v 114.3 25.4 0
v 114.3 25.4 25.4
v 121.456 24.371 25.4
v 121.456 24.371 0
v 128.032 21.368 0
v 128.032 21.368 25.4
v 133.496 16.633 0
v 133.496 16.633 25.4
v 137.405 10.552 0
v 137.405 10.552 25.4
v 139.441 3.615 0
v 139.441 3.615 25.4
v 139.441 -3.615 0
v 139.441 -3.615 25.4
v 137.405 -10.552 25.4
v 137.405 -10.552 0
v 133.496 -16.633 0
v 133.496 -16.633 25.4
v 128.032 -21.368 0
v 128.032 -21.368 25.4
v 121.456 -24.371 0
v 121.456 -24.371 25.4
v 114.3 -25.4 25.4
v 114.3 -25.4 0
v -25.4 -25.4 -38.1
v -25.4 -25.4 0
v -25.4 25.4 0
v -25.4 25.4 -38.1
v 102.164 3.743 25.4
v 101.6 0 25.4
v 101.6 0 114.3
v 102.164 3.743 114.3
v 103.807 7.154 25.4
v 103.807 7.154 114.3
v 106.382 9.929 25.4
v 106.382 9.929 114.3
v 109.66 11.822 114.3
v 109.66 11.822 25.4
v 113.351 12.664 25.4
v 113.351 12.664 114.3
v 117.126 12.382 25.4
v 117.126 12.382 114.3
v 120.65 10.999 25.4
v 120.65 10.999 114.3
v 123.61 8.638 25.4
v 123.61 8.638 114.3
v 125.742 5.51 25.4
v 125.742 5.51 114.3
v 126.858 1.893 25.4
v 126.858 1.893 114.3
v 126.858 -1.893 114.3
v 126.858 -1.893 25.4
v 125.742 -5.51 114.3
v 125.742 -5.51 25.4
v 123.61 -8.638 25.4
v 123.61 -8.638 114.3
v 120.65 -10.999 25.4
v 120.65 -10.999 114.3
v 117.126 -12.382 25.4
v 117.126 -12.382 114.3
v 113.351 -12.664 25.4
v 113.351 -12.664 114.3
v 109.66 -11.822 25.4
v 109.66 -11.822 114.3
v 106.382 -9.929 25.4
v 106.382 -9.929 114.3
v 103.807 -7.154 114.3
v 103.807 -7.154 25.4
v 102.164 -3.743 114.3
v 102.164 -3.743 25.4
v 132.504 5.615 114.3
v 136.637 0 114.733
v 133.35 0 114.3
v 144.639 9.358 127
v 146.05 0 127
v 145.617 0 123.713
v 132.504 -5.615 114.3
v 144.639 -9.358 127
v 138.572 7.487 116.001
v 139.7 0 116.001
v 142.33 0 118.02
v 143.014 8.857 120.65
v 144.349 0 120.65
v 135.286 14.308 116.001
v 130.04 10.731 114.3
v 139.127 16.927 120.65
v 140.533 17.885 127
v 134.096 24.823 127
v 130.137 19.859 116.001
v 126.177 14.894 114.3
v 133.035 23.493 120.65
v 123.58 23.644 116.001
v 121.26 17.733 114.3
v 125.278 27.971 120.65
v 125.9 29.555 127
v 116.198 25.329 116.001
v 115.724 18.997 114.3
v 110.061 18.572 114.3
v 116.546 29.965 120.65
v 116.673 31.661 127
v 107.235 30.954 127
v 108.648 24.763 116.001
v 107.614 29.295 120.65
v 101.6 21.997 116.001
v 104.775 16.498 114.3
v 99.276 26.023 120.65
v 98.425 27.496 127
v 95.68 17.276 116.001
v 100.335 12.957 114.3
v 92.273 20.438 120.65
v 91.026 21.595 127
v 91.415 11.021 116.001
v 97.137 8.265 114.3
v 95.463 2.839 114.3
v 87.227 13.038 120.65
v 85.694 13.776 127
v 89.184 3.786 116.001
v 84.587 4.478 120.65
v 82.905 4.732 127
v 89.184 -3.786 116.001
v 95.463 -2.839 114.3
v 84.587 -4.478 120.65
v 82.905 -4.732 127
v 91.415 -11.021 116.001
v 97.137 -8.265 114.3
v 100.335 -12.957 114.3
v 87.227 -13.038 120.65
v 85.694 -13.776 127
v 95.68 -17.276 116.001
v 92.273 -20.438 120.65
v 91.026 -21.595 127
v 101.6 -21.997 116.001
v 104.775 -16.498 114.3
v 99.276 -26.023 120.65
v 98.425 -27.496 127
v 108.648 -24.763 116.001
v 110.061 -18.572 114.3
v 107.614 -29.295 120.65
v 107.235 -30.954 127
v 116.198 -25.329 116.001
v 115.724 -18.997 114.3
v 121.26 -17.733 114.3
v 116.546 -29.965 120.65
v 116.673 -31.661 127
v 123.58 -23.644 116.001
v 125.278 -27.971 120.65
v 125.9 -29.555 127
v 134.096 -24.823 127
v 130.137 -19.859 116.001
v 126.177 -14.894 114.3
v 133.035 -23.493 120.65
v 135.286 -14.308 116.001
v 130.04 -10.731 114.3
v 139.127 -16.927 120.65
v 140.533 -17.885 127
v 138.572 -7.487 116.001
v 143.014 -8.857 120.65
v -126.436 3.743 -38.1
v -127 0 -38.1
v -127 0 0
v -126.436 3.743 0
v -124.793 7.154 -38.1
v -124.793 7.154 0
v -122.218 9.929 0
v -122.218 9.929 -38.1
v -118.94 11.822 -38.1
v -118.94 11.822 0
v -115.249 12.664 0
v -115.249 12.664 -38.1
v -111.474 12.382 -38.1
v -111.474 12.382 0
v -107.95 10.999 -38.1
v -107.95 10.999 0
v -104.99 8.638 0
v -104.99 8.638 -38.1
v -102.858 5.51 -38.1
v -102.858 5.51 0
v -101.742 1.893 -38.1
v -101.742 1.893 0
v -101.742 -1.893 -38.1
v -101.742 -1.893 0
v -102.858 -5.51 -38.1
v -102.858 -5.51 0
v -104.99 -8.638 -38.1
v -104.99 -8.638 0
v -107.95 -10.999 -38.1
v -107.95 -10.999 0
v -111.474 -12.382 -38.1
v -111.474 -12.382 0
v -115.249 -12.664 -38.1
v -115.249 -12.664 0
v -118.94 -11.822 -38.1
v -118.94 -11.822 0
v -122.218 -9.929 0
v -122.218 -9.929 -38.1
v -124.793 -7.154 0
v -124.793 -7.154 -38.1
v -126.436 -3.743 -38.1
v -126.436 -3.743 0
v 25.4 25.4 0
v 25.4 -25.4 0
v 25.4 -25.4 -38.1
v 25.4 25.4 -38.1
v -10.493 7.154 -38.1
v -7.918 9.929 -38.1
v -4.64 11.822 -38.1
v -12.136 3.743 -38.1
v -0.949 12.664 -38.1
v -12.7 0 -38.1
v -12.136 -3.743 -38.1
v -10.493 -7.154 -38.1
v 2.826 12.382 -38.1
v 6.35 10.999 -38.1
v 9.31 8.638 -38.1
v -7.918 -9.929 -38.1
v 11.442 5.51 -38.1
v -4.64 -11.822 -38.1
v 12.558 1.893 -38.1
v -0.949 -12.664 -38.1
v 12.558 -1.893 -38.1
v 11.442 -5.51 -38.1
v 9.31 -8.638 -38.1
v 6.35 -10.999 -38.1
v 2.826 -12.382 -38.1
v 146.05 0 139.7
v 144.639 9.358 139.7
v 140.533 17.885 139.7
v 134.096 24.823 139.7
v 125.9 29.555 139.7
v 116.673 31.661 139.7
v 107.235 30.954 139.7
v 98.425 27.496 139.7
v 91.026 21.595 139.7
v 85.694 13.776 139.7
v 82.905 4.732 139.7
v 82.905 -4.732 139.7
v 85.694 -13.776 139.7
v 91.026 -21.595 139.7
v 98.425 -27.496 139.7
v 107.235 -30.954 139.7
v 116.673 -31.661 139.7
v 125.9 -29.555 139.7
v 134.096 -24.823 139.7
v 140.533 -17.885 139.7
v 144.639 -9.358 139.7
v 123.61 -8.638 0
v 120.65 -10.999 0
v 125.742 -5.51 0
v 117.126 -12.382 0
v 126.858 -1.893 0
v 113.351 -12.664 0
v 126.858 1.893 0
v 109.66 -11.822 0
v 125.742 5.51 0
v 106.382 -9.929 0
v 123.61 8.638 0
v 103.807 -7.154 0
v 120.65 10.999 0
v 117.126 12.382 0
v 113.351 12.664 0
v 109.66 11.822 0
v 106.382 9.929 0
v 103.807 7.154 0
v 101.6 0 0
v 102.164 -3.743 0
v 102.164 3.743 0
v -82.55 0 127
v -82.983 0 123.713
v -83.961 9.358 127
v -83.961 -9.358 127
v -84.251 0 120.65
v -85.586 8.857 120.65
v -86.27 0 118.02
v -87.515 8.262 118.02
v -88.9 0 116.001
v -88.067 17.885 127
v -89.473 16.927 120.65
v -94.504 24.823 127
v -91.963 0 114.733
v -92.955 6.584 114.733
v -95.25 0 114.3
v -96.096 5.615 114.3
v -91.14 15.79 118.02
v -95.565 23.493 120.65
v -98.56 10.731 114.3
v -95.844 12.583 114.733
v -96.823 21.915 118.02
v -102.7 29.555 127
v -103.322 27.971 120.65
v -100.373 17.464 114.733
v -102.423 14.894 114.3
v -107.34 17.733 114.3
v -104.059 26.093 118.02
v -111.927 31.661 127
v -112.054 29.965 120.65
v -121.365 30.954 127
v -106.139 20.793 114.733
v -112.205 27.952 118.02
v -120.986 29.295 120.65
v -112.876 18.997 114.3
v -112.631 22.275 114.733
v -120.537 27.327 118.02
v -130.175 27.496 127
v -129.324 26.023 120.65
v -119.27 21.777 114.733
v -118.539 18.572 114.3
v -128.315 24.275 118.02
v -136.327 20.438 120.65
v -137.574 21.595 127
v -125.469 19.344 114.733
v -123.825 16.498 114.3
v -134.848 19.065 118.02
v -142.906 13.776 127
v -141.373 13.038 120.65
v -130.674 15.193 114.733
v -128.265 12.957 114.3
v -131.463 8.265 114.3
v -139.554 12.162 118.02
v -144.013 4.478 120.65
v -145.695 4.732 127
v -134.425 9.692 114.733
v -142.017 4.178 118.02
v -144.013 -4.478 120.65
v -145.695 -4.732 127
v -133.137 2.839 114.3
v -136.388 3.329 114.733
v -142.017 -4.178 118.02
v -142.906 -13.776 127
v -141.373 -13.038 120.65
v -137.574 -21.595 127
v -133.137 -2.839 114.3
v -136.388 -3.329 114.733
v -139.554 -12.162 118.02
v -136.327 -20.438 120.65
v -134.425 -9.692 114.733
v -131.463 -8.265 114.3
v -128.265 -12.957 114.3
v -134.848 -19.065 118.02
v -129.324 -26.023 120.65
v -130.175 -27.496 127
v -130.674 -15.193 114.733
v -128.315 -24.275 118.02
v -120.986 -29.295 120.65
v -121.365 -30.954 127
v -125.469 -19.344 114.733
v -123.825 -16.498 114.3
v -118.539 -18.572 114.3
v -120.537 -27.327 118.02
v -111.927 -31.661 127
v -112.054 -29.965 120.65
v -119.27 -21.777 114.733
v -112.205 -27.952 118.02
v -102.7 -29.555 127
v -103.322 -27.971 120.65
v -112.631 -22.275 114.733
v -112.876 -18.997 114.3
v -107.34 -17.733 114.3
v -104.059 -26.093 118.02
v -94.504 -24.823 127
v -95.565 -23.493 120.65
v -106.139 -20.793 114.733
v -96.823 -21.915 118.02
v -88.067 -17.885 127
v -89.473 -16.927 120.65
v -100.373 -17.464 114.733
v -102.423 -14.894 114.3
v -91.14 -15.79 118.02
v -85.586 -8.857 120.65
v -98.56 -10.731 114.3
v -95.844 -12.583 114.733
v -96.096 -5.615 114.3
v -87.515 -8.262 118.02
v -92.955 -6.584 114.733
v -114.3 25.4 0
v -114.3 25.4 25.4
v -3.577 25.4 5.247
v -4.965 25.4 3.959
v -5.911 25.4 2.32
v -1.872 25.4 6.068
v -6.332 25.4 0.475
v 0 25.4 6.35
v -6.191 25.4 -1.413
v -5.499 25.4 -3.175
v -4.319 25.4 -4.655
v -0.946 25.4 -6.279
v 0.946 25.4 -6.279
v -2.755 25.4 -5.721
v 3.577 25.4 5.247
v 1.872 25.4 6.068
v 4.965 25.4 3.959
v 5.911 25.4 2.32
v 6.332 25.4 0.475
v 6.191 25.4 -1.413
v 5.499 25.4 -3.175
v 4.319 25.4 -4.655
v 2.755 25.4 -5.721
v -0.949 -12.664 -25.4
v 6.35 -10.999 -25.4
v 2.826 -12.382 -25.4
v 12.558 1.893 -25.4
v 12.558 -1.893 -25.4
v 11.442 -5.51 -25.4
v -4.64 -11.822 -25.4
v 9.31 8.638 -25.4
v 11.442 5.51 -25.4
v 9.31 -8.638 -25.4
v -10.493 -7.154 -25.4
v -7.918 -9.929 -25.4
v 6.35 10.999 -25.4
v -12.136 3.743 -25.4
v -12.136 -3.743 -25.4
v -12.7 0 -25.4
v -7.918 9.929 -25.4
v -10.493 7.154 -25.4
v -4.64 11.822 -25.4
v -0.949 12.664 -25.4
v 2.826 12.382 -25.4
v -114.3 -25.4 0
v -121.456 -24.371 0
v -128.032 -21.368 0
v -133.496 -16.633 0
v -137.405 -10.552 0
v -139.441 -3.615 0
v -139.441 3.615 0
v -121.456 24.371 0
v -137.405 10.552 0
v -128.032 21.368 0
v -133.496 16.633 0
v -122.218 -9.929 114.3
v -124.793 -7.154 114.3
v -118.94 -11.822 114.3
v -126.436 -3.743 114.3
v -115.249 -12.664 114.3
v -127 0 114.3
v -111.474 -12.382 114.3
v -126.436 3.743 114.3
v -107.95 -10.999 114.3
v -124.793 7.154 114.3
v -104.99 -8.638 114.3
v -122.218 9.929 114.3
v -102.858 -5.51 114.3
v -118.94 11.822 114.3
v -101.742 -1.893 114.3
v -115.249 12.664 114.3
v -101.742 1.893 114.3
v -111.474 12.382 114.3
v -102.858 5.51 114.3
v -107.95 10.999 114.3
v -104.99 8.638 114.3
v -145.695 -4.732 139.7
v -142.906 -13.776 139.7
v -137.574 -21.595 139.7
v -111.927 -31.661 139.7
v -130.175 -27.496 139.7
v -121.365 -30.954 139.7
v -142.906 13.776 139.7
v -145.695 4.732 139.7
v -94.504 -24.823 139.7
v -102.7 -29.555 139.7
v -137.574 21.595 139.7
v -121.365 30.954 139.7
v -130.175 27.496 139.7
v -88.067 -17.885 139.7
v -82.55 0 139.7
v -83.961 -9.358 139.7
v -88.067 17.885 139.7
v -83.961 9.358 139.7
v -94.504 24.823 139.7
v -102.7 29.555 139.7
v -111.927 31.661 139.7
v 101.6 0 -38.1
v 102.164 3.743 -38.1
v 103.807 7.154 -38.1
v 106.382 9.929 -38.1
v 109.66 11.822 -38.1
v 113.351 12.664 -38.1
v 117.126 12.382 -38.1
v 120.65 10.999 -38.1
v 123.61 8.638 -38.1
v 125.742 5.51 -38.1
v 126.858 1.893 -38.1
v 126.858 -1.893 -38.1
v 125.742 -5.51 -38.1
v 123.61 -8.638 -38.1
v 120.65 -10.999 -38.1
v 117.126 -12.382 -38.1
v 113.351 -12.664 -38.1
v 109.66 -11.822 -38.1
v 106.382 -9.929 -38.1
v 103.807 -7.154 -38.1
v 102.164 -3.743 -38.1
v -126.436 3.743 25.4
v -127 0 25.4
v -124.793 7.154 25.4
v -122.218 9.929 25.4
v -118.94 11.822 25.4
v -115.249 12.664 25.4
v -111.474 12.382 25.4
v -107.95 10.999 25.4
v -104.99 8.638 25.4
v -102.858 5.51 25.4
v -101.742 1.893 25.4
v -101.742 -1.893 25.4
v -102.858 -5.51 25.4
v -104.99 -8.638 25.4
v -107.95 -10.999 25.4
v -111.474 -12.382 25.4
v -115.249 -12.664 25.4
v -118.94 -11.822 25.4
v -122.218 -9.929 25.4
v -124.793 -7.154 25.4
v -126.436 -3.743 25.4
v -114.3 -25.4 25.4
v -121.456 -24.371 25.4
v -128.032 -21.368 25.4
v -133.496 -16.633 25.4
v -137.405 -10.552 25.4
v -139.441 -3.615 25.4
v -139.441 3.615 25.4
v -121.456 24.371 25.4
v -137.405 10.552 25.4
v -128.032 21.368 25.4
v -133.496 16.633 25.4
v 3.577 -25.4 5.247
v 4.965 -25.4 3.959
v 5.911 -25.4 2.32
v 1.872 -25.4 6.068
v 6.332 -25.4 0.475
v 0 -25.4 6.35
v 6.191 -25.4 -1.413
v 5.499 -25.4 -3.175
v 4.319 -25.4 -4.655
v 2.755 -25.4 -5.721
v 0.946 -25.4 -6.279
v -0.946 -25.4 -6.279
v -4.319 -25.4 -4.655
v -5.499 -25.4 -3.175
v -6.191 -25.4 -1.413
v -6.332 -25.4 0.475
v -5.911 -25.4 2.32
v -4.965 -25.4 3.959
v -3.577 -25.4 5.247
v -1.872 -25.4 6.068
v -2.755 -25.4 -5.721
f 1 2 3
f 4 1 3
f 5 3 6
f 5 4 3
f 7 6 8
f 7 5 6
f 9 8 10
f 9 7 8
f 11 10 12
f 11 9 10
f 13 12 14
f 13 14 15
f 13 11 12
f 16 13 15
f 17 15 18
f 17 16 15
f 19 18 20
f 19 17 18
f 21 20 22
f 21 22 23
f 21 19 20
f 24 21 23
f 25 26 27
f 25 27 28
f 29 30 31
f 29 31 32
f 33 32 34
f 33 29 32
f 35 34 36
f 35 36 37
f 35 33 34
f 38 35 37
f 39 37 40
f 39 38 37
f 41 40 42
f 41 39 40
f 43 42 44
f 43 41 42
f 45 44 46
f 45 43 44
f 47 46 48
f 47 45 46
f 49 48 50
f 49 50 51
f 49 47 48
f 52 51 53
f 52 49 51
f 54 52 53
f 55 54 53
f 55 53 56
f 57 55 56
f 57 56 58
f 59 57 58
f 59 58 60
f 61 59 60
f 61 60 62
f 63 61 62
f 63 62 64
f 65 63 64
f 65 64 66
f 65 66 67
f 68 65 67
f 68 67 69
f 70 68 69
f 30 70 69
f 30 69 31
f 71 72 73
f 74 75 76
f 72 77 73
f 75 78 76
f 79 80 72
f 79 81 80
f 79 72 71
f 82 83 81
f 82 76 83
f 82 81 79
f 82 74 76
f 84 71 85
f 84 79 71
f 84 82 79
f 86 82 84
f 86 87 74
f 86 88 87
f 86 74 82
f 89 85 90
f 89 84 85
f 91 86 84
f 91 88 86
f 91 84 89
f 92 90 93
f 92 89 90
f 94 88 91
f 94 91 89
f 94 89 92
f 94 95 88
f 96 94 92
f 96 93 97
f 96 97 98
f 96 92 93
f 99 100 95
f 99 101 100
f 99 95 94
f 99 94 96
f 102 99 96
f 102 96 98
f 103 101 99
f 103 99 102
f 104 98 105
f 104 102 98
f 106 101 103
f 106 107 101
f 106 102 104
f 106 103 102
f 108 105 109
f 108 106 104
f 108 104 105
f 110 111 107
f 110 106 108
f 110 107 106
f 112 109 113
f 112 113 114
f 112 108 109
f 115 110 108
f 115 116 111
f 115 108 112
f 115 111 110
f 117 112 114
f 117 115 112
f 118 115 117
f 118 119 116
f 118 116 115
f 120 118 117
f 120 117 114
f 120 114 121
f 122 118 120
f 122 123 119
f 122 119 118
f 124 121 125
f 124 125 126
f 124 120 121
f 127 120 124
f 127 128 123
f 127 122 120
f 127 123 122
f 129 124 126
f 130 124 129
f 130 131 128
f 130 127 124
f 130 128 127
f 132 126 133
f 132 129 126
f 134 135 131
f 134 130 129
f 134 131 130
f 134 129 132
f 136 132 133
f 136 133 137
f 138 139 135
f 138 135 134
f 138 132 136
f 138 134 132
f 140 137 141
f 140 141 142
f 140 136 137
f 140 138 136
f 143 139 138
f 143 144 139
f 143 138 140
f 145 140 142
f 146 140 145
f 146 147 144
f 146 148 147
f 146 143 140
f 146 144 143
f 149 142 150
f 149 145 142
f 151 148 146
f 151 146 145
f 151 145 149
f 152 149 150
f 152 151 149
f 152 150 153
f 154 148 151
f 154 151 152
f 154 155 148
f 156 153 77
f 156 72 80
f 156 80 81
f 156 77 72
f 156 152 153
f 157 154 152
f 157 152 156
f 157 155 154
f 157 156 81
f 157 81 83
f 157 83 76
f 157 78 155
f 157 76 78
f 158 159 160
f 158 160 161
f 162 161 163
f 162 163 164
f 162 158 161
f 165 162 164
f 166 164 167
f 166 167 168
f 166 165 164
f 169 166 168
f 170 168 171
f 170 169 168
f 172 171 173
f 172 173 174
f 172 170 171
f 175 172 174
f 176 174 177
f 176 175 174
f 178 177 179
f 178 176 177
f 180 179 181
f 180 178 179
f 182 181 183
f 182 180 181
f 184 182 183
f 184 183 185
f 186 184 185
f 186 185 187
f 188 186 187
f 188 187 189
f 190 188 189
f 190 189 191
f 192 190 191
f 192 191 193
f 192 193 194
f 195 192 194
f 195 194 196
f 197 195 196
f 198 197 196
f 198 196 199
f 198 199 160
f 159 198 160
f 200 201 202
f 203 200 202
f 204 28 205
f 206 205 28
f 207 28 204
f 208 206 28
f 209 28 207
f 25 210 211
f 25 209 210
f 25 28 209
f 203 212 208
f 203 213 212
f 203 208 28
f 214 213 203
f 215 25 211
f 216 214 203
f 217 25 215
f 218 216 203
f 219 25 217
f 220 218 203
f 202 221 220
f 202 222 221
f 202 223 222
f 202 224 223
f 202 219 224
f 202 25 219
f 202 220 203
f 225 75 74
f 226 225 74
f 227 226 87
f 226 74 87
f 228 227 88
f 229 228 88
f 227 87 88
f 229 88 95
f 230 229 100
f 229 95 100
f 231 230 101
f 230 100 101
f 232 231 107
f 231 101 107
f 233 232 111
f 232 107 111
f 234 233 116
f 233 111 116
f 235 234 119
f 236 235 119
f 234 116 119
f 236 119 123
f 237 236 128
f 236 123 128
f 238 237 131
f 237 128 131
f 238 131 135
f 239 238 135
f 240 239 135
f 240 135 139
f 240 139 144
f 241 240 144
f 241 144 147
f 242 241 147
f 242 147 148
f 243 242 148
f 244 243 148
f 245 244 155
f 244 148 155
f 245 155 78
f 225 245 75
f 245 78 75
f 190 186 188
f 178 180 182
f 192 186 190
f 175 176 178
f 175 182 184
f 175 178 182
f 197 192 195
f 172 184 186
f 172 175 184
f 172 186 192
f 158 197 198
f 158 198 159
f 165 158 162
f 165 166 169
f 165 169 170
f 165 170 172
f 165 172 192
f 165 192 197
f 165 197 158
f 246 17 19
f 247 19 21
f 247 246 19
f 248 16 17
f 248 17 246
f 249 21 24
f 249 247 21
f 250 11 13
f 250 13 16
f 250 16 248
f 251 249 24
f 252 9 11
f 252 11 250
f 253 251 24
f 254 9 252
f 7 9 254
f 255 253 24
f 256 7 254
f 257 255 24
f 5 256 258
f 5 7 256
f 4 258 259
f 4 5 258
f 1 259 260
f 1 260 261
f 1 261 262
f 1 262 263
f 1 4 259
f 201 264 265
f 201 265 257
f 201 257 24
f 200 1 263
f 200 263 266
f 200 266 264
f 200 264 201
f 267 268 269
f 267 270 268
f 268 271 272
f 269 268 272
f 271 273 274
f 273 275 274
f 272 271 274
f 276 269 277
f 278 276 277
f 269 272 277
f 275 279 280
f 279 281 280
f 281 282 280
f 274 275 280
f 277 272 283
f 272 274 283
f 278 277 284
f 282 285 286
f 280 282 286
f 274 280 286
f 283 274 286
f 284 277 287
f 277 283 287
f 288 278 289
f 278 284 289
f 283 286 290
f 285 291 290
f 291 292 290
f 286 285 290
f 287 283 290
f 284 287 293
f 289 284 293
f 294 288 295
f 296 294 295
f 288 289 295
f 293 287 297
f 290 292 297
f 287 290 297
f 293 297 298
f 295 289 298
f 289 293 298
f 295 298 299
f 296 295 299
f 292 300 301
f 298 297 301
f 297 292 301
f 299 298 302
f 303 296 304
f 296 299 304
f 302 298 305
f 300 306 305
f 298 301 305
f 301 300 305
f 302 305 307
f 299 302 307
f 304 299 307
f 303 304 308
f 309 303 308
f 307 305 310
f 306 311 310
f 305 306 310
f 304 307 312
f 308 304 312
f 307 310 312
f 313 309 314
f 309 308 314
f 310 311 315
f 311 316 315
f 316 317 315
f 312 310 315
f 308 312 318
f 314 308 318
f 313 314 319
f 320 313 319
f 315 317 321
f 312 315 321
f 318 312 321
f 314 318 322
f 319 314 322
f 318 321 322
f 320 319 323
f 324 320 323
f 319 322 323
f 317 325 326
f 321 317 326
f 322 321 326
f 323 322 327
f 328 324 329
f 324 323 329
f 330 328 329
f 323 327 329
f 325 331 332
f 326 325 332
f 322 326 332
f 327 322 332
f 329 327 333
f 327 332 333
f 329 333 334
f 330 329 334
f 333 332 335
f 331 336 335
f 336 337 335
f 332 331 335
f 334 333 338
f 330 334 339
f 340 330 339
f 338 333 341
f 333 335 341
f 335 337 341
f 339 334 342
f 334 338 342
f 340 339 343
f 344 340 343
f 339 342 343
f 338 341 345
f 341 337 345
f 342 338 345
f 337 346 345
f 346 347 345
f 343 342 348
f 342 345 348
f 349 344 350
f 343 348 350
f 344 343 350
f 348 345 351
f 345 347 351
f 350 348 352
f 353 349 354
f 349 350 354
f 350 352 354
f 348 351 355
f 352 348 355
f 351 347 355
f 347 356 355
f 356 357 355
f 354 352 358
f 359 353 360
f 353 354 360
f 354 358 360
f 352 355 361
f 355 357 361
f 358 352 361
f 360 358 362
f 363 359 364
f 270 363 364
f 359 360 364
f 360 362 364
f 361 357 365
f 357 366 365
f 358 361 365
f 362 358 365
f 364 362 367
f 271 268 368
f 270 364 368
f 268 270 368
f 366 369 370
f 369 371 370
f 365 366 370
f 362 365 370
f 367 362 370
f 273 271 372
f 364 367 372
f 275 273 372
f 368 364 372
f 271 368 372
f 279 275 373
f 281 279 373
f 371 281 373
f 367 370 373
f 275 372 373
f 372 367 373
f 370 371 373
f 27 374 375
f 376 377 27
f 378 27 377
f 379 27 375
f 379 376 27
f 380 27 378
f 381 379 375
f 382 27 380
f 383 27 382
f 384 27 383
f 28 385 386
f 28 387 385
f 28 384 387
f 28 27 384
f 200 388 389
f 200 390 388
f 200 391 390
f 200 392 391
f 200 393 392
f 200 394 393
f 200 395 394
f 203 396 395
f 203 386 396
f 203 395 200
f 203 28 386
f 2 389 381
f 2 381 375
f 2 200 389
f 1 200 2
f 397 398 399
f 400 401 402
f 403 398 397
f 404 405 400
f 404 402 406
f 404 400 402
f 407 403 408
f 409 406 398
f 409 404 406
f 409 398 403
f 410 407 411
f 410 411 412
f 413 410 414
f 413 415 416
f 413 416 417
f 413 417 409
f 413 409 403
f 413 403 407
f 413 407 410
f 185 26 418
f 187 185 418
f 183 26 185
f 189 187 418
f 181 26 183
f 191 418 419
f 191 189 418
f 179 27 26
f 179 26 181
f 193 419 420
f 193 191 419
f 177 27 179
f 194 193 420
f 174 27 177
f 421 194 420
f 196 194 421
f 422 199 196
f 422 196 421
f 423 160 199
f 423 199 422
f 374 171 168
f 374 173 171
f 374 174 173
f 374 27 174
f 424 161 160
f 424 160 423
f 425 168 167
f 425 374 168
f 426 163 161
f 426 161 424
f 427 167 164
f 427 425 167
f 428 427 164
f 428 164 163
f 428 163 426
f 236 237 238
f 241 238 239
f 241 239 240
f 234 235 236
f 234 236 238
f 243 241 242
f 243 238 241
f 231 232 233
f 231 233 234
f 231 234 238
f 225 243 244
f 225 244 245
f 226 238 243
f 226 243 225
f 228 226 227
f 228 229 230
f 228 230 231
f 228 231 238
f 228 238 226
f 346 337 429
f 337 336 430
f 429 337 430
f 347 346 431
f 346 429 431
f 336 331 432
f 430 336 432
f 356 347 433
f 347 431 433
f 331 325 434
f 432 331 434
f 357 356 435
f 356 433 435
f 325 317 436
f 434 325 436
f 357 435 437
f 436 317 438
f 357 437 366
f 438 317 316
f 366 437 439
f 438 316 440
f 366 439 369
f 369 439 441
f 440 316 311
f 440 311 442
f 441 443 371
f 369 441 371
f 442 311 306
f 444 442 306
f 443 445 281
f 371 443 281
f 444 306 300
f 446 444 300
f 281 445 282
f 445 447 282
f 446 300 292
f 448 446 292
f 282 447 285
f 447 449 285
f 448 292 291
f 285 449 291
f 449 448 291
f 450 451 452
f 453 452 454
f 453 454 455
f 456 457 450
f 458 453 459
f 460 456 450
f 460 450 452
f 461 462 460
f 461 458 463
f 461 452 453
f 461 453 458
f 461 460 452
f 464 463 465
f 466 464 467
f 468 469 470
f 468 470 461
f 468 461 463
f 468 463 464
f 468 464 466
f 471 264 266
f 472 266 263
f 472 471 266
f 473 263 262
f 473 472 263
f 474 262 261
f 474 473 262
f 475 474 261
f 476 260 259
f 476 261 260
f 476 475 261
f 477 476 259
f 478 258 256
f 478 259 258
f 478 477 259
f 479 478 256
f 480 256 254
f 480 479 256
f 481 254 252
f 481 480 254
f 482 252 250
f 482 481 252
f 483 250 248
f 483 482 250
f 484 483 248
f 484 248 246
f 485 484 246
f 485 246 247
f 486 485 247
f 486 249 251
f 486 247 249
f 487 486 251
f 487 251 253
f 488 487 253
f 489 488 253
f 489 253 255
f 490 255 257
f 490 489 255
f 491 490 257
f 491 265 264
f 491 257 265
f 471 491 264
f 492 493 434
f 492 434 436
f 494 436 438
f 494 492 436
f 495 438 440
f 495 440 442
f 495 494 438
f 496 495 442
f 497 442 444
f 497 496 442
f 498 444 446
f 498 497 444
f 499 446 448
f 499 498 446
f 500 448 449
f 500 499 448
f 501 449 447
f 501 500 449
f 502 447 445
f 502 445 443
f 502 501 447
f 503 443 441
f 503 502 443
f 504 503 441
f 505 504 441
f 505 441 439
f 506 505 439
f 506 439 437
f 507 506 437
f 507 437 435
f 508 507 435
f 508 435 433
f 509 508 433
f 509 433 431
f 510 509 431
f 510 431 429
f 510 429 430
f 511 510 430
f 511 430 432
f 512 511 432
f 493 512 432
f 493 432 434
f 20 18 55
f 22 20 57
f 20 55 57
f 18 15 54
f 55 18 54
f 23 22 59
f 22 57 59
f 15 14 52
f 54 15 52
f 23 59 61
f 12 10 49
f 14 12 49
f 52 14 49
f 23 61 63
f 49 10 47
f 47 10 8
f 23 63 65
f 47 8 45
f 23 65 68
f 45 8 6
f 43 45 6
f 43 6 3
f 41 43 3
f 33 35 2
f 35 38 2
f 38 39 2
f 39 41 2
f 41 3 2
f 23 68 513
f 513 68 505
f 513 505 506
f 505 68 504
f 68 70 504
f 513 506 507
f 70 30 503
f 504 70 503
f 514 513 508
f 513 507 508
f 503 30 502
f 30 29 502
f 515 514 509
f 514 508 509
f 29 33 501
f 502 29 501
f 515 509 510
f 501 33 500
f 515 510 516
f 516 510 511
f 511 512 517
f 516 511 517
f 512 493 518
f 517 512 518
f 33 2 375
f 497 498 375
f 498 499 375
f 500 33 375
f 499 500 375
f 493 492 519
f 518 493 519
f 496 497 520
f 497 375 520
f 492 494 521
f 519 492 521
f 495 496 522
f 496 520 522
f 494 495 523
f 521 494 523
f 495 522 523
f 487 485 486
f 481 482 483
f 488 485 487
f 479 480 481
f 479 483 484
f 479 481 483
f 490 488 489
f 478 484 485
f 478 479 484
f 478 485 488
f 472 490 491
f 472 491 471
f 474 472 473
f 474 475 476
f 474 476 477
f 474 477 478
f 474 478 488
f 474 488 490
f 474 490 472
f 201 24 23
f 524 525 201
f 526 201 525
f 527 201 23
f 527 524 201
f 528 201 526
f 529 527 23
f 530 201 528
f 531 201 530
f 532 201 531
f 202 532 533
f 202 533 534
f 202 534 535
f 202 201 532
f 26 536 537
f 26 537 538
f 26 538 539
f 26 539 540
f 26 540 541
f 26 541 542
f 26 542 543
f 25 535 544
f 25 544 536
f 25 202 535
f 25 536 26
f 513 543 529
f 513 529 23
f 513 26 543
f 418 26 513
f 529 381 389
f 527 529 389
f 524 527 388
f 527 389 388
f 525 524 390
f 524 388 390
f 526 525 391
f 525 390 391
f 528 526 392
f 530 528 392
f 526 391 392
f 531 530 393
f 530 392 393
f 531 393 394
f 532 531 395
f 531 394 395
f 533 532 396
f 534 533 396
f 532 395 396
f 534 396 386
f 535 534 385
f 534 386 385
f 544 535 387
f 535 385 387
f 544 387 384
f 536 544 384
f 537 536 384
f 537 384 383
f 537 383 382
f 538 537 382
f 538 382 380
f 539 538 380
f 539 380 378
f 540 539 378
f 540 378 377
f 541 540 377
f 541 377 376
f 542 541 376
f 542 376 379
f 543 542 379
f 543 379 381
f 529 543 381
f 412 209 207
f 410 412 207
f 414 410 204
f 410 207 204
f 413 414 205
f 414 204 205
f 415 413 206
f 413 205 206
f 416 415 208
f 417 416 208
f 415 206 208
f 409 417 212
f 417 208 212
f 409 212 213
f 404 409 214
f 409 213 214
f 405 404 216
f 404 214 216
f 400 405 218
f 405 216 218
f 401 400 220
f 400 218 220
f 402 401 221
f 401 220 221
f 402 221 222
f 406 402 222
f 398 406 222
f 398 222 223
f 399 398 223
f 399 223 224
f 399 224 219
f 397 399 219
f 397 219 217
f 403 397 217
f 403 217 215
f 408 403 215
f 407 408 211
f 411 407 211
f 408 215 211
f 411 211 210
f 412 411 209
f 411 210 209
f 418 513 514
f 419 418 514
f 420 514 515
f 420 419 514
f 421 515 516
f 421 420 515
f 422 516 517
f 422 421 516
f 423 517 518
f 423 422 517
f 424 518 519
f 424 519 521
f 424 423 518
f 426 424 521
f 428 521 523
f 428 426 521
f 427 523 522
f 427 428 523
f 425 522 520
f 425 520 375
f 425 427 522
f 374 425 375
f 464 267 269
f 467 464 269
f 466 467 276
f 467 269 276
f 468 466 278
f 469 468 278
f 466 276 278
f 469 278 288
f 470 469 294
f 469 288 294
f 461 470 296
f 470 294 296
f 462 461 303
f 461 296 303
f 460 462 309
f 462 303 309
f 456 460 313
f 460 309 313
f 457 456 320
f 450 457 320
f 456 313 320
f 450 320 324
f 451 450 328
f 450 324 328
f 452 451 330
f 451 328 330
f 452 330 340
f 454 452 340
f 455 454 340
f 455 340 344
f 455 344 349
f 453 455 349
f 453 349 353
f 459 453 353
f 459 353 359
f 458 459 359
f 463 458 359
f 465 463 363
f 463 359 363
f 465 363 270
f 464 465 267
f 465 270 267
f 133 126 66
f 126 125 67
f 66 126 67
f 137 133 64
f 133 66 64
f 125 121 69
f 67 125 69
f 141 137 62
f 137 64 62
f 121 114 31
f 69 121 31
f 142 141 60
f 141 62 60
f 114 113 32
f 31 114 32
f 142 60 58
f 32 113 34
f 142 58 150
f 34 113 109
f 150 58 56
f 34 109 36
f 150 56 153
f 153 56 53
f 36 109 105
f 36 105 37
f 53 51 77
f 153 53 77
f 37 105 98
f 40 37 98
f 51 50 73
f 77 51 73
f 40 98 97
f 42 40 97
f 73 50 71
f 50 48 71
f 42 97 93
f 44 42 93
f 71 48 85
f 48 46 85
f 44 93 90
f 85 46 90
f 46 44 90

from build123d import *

# Parameters (mm, degrees)
SKETCH1_R                = 12.7
BOSS_EXTRUDE1_DEPTH      = 25.4
BOSS_EXTRUDE2_DEPTH      = 25.4
BOSS_EXTRUDE2_DEPTH_BACK = 25.4
SKETCH2_W                = 50.8
SKETCH2_H                = 38.1
SKETCH3_R                = 6.35
CUT_EXTRUDE1_DEPTH       = 154.454683865
SKETCH4_R                = 12.7
CUT_EXTRUDE2_DEPTH       = 12.7
SKETCH5_R                = 12.7
BOSS_EXTRUDE3_DEPTH      = 152.4
SKETCH6_R                = 31.75
BOSS_EXTRUDE4_DEPTH      = 25.4
FILLET1_R                = 12.7


with BuildPart() as part:
    # Sketch1 → Boss-Extrude1 (new body)
    with BuildSketch(Plane.XY):
        with BuildLine():
            Line((-114.3, 25.4), (114.3, 25.4))
            ThreePointArc((114.3, 25.4), (139.7, 0), (114.3, -25.4))
            Line((114.3, -25.4), (-114.3, -25.4))
            ThreePointArc((-114.3, -25.4), (-139.7, 0), (-114.3, 25.4))
        make_face()
        with Locations((-114.3, 0)):
            Circle(SKETCH1_R, mode=Mode.SUBTRACT)
        with Locations((114.3, 0)):
            Circle(SKETCH1_R, mode=Mode.SUBTRACT)
    extrude(amount=BOSS_EXTRUDE1_DEPTH)

    # Sketch2 → Boss-Extrude2 (add, two sides: drawn at the far end of the back side and taken through both)
    with BuildSketch(Plane(origin=(0, 0, 0), x_dir=(1, 0, 0), z_dir=(0, 1, 0)).offset(-BOSS_EXTRUDE2_DEPTH_BACK)):
        with Locations((0, 19.05)):
            Rectangle(SKETCH2_W, SKETCH2_H)
    extrude(amount=BOSS_EXTRUDE2_DEPTH + BOSS_EXTRUDE2_DEPTH_BACK)

    # Sketch3 → Cut-Extrude1 (cut, through all)
    with BuildSketch(Plane(origin=(0, 25.4, 0), x_dir=(1, 0, 0), z_dir=(0, 1, 0))):
        with Locations(Location((0, 0, 0), (0, 0, 270))):
            Circle(SKETCH3_R)
    extrude(amount=-CUT_EXTRUDE1_DEPTH, mode=Mode.SUBTRACT)

    # Sketch4 → Cut-Extrude2 (cut)
    with BuildSketch(Plane(origin=(0, 0, -38.1), x_dir=(-1, 0, 0), z_dir=(0, 0, -1))):
        Circle(SKETCH4_R)
    extrude(amount=-CUT_EXTRUDE2_DEPTH, mode=Mode.SUBTRACT)

    # Sketch5 → Boss-Extrude3 (add)
    with BuildSketch(Plane(origin=(0, 0, -38.1), x_dir=(-1, 0, 0), z_dir=(0, 0, -1))):
        with Locations((114.3, 0)):
            Circle(SKETCH5_R)
        with Locations((-114.3, 0)):
            Circle(SKETCH5_R)
    extrude(amount=-BOSS_EXTRUDE3_DEPTH)

    # Sketch6 → Boss-Extrude4 (add)
    with BuildSketch(Plane.XY.offset(114.3)):
        with Locations((-114.3, 0)):
            Circle(SKETCH6_R)
        with Locations((114.3, 0)):
            Circle(SKETCH6_R)
    extrude(amount=BOSS_EXTRUDE4_DEPTH)

    # Fillet1
    fillet1_edges = [part.edges().sort_by_distance(p)[0] for p in [
        (-146.05, 0, 114.3),
        (82.55, 0, 114.3),
    ]]
    fillet(fillet1_edges, radius=FILLET1_R)


solid = part.part
